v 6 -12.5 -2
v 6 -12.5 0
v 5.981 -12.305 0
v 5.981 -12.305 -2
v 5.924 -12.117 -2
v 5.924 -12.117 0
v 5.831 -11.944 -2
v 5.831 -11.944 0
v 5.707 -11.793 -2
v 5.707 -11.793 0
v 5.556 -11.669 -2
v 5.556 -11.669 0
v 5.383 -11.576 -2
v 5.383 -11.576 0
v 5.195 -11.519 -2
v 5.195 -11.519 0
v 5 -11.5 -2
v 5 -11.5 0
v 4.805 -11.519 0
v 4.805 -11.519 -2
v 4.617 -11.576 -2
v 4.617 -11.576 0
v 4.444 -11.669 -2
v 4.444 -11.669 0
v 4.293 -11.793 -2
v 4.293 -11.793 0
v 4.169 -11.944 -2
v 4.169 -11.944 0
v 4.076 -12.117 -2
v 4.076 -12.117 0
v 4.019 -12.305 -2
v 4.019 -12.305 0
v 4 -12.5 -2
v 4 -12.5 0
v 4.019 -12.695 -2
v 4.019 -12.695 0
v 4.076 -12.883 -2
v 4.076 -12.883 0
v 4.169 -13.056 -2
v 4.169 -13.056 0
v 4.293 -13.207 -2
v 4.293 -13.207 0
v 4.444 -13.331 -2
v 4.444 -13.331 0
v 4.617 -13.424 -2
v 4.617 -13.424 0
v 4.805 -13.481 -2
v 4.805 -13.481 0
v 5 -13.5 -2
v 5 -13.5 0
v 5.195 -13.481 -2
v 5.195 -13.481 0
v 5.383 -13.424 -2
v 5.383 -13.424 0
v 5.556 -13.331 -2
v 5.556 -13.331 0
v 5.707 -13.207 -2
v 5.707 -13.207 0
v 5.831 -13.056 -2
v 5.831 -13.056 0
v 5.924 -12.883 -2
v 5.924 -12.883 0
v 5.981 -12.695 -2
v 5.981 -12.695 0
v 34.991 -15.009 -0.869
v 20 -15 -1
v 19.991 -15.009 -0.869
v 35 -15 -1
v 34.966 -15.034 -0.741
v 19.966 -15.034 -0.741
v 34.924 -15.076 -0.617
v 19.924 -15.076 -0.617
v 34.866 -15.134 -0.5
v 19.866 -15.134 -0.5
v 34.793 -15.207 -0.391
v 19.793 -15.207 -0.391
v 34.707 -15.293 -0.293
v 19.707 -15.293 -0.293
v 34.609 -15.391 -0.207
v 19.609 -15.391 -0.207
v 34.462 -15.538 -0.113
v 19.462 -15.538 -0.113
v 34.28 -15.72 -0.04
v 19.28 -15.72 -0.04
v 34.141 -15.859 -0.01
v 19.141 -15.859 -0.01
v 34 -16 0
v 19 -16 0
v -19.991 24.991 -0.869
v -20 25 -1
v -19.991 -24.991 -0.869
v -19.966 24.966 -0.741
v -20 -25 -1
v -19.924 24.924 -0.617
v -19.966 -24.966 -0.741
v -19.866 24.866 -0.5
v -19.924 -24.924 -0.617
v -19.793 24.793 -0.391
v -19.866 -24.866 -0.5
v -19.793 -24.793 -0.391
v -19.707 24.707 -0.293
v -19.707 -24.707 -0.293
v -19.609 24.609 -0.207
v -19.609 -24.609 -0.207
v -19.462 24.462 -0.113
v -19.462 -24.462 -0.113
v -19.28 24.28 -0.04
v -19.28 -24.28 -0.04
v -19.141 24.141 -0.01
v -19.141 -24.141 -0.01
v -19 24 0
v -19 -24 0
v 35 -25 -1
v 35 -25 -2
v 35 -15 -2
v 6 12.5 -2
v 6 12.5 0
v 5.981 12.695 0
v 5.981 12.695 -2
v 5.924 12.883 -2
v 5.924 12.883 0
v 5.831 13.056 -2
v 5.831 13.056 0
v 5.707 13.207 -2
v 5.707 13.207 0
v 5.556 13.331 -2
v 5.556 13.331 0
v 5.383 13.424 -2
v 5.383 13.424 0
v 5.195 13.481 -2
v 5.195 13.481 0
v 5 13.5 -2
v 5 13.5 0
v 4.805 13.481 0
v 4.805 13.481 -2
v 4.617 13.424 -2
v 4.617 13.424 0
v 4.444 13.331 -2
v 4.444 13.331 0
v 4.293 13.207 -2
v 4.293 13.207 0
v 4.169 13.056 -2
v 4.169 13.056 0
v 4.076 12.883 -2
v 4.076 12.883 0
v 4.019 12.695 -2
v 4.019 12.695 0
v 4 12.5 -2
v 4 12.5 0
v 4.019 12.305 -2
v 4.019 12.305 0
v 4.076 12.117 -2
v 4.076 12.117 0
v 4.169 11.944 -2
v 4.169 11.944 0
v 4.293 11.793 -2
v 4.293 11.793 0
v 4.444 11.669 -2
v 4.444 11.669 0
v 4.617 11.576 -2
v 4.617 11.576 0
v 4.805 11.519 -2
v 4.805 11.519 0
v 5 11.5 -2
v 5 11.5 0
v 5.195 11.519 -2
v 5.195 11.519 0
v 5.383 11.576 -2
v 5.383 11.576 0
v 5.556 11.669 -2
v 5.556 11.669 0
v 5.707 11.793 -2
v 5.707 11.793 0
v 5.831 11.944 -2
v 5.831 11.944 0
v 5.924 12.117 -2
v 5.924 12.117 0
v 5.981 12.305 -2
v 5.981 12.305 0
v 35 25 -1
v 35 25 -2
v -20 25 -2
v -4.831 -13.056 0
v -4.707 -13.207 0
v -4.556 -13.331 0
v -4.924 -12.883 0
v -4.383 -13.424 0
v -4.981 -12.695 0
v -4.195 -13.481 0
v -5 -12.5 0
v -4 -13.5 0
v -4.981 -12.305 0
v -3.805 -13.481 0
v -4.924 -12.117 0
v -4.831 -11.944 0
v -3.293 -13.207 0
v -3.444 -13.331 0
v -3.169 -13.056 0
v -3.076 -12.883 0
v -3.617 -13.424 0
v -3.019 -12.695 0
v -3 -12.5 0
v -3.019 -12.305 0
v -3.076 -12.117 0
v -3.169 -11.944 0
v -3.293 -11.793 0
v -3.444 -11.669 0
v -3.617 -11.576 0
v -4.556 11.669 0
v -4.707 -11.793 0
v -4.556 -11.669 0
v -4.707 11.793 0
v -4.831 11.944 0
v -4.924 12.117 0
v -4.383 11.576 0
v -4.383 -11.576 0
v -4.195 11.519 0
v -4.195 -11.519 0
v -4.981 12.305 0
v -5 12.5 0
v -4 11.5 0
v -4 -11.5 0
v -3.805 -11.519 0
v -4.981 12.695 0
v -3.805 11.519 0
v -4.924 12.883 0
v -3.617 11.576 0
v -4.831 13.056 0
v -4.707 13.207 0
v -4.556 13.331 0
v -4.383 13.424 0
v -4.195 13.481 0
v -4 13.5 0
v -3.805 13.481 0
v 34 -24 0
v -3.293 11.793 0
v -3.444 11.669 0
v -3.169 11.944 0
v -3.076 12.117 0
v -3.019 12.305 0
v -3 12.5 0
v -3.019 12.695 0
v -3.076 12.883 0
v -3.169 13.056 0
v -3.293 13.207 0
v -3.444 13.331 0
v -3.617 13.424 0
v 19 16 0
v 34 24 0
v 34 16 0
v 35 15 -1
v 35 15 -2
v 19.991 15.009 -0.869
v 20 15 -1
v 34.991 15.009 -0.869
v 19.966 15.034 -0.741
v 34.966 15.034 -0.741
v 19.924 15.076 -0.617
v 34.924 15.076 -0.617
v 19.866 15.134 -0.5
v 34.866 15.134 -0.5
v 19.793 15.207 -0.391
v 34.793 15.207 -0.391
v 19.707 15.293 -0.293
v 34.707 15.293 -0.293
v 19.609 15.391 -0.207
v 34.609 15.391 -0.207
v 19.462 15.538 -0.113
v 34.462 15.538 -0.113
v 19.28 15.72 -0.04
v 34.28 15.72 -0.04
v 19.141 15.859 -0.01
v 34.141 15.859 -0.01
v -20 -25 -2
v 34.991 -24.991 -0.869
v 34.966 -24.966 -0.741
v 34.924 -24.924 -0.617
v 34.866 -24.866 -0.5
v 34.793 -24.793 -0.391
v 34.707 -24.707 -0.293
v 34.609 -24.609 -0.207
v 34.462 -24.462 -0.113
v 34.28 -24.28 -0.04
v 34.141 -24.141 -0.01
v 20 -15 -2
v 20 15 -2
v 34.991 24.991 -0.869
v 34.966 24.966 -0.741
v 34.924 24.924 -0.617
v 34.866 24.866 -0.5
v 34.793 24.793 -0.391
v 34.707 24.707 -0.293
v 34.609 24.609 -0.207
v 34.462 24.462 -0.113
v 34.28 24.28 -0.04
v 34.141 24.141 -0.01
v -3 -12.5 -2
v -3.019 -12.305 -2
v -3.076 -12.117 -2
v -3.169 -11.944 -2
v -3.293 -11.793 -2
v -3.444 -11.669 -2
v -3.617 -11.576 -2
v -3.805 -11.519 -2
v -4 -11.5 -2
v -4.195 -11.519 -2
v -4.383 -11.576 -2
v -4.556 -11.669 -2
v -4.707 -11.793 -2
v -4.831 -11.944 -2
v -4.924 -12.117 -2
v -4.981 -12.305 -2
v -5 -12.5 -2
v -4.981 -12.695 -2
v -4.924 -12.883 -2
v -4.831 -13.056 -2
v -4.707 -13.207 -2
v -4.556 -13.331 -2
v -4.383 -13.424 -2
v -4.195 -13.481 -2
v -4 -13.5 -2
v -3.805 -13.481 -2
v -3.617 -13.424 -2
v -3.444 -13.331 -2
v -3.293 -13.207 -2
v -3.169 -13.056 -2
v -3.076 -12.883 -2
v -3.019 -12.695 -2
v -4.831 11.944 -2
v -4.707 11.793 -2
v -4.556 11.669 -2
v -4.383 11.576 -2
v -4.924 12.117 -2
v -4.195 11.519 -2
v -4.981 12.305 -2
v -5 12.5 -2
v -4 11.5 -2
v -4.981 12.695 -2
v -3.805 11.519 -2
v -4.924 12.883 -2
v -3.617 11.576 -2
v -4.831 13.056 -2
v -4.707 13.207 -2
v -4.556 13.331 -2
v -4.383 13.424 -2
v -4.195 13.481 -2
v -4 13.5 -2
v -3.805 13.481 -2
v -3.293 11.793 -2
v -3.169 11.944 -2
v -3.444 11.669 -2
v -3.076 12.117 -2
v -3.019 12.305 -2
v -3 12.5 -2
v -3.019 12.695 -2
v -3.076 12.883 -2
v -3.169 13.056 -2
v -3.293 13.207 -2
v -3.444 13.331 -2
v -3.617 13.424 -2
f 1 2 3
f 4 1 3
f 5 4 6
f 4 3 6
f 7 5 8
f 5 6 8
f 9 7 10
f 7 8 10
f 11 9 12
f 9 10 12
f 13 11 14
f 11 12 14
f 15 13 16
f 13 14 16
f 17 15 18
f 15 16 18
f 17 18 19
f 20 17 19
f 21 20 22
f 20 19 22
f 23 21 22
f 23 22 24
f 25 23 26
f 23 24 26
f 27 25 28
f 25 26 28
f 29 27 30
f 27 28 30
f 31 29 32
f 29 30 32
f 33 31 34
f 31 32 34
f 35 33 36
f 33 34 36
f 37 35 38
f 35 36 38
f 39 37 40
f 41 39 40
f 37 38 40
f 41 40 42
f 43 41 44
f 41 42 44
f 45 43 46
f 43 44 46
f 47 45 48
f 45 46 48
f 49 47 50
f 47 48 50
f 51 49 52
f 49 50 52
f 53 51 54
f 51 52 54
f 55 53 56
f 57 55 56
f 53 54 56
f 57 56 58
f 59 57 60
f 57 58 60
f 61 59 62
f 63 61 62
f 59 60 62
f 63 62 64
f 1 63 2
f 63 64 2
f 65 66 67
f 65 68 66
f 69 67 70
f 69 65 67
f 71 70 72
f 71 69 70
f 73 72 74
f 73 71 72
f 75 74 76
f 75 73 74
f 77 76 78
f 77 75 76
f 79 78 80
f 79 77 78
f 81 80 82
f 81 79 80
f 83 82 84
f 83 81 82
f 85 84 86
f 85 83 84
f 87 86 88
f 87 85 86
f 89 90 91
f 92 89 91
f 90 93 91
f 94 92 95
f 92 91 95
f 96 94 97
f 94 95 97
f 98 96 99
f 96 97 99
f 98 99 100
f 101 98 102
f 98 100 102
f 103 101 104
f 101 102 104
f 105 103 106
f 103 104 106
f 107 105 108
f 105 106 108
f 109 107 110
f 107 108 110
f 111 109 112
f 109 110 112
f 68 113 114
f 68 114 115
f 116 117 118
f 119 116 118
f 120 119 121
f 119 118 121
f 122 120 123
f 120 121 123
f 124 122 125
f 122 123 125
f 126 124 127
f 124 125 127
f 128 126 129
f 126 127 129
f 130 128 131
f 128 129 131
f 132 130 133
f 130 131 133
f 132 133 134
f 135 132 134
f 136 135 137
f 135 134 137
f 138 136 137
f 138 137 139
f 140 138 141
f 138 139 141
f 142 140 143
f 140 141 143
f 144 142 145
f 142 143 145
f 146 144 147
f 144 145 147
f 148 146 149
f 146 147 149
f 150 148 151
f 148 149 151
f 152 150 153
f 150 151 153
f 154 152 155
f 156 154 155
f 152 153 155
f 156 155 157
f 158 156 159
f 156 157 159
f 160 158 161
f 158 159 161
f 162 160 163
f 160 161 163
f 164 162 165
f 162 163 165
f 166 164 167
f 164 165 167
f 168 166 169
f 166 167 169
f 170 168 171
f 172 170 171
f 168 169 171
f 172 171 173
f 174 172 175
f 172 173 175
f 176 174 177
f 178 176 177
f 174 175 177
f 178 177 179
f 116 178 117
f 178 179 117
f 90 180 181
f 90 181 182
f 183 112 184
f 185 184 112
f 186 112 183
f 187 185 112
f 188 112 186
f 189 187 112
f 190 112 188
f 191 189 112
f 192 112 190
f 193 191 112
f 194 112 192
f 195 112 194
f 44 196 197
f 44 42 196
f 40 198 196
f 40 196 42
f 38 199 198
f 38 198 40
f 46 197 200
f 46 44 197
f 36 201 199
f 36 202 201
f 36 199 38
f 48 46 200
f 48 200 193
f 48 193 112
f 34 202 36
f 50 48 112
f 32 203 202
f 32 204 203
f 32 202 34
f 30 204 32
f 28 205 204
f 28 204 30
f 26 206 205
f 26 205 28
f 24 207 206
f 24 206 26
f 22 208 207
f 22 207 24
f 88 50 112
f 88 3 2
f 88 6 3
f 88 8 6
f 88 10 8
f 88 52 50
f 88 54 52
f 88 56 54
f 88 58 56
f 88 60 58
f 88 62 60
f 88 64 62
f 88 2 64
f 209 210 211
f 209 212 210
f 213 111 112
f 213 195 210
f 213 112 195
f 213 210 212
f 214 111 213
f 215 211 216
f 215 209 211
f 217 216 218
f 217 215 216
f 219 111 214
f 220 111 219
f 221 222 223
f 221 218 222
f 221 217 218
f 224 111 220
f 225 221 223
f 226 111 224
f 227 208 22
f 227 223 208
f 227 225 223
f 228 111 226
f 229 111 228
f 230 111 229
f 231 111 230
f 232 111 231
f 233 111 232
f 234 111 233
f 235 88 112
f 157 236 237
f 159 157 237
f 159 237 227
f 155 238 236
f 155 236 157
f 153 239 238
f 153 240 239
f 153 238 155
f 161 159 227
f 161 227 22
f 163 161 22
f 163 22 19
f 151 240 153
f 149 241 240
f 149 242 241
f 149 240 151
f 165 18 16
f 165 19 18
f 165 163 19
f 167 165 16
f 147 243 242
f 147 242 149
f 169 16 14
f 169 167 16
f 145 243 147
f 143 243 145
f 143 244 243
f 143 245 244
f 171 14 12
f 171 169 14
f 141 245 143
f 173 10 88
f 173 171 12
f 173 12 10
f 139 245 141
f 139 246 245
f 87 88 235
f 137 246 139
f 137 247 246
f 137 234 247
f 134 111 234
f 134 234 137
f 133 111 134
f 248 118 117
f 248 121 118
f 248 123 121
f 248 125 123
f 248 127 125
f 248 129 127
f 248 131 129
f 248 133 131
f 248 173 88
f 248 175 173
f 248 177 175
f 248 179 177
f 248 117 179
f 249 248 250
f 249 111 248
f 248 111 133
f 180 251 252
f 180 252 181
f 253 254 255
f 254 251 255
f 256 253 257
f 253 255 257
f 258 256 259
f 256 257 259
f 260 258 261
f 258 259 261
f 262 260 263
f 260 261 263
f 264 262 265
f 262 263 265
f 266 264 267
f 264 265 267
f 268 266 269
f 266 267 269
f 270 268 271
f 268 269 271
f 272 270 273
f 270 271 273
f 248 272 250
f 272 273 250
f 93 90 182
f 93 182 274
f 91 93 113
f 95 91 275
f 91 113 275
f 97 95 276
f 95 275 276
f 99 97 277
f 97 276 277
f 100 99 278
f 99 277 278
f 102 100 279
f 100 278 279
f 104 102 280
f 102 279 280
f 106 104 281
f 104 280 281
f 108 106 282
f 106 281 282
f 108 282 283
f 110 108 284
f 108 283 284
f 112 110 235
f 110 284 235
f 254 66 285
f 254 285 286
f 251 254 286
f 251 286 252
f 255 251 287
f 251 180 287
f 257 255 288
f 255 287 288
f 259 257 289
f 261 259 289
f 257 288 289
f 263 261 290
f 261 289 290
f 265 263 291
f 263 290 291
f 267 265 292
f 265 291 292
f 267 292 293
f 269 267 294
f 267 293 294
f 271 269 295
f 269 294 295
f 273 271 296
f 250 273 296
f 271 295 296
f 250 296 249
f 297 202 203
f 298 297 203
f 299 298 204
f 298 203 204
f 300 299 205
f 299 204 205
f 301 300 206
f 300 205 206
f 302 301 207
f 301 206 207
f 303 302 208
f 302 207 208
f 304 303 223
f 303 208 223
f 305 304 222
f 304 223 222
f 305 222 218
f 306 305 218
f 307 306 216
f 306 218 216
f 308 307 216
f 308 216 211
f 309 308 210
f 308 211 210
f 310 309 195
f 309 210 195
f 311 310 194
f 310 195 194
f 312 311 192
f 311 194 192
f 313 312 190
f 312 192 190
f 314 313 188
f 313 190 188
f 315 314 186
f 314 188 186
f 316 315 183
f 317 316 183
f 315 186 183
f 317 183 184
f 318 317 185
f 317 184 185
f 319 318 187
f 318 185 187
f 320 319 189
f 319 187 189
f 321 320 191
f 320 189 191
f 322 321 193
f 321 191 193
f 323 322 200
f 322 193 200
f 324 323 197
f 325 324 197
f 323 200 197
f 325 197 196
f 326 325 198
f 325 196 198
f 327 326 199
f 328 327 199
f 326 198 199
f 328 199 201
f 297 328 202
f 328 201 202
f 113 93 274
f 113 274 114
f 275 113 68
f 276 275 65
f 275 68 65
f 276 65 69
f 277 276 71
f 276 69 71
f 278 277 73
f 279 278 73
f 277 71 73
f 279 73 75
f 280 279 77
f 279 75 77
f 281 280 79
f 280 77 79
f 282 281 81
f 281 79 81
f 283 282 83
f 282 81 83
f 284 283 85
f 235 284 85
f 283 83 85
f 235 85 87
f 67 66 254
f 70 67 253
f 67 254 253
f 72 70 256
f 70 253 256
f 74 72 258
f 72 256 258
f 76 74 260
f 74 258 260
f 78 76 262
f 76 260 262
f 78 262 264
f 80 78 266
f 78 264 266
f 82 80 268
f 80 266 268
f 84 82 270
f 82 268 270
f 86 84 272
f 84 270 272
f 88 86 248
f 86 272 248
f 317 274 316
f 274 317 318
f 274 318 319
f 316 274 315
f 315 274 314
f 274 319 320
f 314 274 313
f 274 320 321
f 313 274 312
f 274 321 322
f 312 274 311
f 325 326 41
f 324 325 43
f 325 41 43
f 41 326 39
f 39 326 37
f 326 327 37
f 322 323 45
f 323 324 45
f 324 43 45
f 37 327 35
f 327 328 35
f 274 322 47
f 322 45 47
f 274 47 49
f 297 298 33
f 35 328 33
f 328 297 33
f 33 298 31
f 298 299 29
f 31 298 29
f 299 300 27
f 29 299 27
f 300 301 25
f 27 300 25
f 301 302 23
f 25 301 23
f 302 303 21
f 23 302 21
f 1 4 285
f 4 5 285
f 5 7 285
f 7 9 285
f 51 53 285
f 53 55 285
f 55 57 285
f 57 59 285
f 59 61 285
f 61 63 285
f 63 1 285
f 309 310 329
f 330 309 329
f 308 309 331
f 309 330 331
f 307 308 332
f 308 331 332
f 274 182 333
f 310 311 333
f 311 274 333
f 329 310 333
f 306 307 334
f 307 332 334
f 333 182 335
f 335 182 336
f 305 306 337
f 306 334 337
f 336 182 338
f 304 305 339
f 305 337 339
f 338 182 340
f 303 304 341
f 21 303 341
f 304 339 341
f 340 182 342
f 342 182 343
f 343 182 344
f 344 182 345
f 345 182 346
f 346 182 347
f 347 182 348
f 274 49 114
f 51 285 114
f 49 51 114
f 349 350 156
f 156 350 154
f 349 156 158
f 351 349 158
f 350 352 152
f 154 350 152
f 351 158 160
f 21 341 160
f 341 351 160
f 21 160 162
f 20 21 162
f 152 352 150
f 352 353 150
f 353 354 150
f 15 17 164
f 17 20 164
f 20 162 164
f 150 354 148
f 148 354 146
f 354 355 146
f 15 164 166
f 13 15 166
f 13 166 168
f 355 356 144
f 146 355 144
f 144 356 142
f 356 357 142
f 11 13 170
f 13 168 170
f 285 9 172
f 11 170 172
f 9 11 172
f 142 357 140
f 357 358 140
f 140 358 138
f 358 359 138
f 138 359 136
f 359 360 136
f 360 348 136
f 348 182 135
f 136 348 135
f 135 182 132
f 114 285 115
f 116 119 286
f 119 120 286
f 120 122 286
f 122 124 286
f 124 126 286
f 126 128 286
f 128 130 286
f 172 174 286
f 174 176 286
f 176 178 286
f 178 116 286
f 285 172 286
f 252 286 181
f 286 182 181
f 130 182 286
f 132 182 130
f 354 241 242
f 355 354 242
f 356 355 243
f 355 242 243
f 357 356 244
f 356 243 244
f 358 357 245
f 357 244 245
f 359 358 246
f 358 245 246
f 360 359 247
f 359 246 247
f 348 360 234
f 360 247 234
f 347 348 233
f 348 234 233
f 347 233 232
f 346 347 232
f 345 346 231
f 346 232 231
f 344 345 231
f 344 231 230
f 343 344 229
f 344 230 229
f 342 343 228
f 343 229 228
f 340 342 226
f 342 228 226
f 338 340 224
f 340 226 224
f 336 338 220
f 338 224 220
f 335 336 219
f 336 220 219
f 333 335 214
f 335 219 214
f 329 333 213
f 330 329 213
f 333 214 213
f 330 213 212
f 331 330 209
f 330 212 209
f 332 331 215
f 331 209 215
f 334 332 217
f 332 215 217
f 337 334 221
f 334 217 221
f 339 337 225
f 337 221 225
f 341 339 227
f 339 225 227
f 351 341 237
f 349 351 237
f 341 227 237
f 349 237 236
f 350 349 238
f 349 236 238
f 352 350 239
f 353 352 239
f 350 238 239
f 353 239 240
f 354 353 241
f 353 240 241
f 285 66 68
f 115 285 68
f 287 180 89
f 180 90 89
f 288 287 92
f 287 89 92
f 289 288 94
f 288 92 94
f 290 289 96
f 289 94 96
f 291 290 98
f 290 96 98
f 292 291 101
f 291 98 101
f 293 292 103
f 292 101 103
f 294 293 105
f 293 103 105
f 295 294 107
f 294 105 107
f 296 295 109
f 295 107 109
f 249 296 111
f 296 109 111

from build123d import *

# Parameters (mm, degrees)
F0_R     = 1
F0_W     = 15
F0_H     = 10
F1_DEPTH = 2
F2_R     = 1


# Not quite as in the source:
# - a feature names something its author has since deleted; it is built from what else it names


with BuildPart() as f1:
    # F0 (on Top) → F1 (new body)
    with BuildSketch(Plane.XY):
        Polygon((-20, -25), (20, -25), (20, -15), (20, 15), (20, 25), (-20, 25), align=None)
        with Locations((-4, -12.5)):
            Circle(F0_R, mode=Mode.SUBTRACT)
        with Locations((5, -12.5)):
            Circle(F0_R, mode=Mode.SUBTRACT)
        with Locations((-4, 12.5)):
            Circle(F0_R, mode=Mode.SUBTRACT)
        with Locations((5, 12.5)):
            Circle(F0_R, mode=Mode.SUBTRACT)
        with Locations((27.5, -20)):
            Rectangle(F0_W, F0_H)
        with Locations((27.5, 20)):
            Rectangle(F0_W, F0_H)
    extrude(amount=-F1_DEPTH)

    # F2
    f2_edges = [f1.edges().sort_by_distance(p)[0] for p in [
        (7.5, 25, 0),
        (-20, 0, 0),
        (35, 20, 0),
        (27.5, 15, 0),
        (20, 0, 0),
        (27.5, -15, 0),
        (35, -20, 0),
        (7.5, -25, 0),
    ]]
    fillet(f2_edges, radius=F2_R)


solid = f1.part
